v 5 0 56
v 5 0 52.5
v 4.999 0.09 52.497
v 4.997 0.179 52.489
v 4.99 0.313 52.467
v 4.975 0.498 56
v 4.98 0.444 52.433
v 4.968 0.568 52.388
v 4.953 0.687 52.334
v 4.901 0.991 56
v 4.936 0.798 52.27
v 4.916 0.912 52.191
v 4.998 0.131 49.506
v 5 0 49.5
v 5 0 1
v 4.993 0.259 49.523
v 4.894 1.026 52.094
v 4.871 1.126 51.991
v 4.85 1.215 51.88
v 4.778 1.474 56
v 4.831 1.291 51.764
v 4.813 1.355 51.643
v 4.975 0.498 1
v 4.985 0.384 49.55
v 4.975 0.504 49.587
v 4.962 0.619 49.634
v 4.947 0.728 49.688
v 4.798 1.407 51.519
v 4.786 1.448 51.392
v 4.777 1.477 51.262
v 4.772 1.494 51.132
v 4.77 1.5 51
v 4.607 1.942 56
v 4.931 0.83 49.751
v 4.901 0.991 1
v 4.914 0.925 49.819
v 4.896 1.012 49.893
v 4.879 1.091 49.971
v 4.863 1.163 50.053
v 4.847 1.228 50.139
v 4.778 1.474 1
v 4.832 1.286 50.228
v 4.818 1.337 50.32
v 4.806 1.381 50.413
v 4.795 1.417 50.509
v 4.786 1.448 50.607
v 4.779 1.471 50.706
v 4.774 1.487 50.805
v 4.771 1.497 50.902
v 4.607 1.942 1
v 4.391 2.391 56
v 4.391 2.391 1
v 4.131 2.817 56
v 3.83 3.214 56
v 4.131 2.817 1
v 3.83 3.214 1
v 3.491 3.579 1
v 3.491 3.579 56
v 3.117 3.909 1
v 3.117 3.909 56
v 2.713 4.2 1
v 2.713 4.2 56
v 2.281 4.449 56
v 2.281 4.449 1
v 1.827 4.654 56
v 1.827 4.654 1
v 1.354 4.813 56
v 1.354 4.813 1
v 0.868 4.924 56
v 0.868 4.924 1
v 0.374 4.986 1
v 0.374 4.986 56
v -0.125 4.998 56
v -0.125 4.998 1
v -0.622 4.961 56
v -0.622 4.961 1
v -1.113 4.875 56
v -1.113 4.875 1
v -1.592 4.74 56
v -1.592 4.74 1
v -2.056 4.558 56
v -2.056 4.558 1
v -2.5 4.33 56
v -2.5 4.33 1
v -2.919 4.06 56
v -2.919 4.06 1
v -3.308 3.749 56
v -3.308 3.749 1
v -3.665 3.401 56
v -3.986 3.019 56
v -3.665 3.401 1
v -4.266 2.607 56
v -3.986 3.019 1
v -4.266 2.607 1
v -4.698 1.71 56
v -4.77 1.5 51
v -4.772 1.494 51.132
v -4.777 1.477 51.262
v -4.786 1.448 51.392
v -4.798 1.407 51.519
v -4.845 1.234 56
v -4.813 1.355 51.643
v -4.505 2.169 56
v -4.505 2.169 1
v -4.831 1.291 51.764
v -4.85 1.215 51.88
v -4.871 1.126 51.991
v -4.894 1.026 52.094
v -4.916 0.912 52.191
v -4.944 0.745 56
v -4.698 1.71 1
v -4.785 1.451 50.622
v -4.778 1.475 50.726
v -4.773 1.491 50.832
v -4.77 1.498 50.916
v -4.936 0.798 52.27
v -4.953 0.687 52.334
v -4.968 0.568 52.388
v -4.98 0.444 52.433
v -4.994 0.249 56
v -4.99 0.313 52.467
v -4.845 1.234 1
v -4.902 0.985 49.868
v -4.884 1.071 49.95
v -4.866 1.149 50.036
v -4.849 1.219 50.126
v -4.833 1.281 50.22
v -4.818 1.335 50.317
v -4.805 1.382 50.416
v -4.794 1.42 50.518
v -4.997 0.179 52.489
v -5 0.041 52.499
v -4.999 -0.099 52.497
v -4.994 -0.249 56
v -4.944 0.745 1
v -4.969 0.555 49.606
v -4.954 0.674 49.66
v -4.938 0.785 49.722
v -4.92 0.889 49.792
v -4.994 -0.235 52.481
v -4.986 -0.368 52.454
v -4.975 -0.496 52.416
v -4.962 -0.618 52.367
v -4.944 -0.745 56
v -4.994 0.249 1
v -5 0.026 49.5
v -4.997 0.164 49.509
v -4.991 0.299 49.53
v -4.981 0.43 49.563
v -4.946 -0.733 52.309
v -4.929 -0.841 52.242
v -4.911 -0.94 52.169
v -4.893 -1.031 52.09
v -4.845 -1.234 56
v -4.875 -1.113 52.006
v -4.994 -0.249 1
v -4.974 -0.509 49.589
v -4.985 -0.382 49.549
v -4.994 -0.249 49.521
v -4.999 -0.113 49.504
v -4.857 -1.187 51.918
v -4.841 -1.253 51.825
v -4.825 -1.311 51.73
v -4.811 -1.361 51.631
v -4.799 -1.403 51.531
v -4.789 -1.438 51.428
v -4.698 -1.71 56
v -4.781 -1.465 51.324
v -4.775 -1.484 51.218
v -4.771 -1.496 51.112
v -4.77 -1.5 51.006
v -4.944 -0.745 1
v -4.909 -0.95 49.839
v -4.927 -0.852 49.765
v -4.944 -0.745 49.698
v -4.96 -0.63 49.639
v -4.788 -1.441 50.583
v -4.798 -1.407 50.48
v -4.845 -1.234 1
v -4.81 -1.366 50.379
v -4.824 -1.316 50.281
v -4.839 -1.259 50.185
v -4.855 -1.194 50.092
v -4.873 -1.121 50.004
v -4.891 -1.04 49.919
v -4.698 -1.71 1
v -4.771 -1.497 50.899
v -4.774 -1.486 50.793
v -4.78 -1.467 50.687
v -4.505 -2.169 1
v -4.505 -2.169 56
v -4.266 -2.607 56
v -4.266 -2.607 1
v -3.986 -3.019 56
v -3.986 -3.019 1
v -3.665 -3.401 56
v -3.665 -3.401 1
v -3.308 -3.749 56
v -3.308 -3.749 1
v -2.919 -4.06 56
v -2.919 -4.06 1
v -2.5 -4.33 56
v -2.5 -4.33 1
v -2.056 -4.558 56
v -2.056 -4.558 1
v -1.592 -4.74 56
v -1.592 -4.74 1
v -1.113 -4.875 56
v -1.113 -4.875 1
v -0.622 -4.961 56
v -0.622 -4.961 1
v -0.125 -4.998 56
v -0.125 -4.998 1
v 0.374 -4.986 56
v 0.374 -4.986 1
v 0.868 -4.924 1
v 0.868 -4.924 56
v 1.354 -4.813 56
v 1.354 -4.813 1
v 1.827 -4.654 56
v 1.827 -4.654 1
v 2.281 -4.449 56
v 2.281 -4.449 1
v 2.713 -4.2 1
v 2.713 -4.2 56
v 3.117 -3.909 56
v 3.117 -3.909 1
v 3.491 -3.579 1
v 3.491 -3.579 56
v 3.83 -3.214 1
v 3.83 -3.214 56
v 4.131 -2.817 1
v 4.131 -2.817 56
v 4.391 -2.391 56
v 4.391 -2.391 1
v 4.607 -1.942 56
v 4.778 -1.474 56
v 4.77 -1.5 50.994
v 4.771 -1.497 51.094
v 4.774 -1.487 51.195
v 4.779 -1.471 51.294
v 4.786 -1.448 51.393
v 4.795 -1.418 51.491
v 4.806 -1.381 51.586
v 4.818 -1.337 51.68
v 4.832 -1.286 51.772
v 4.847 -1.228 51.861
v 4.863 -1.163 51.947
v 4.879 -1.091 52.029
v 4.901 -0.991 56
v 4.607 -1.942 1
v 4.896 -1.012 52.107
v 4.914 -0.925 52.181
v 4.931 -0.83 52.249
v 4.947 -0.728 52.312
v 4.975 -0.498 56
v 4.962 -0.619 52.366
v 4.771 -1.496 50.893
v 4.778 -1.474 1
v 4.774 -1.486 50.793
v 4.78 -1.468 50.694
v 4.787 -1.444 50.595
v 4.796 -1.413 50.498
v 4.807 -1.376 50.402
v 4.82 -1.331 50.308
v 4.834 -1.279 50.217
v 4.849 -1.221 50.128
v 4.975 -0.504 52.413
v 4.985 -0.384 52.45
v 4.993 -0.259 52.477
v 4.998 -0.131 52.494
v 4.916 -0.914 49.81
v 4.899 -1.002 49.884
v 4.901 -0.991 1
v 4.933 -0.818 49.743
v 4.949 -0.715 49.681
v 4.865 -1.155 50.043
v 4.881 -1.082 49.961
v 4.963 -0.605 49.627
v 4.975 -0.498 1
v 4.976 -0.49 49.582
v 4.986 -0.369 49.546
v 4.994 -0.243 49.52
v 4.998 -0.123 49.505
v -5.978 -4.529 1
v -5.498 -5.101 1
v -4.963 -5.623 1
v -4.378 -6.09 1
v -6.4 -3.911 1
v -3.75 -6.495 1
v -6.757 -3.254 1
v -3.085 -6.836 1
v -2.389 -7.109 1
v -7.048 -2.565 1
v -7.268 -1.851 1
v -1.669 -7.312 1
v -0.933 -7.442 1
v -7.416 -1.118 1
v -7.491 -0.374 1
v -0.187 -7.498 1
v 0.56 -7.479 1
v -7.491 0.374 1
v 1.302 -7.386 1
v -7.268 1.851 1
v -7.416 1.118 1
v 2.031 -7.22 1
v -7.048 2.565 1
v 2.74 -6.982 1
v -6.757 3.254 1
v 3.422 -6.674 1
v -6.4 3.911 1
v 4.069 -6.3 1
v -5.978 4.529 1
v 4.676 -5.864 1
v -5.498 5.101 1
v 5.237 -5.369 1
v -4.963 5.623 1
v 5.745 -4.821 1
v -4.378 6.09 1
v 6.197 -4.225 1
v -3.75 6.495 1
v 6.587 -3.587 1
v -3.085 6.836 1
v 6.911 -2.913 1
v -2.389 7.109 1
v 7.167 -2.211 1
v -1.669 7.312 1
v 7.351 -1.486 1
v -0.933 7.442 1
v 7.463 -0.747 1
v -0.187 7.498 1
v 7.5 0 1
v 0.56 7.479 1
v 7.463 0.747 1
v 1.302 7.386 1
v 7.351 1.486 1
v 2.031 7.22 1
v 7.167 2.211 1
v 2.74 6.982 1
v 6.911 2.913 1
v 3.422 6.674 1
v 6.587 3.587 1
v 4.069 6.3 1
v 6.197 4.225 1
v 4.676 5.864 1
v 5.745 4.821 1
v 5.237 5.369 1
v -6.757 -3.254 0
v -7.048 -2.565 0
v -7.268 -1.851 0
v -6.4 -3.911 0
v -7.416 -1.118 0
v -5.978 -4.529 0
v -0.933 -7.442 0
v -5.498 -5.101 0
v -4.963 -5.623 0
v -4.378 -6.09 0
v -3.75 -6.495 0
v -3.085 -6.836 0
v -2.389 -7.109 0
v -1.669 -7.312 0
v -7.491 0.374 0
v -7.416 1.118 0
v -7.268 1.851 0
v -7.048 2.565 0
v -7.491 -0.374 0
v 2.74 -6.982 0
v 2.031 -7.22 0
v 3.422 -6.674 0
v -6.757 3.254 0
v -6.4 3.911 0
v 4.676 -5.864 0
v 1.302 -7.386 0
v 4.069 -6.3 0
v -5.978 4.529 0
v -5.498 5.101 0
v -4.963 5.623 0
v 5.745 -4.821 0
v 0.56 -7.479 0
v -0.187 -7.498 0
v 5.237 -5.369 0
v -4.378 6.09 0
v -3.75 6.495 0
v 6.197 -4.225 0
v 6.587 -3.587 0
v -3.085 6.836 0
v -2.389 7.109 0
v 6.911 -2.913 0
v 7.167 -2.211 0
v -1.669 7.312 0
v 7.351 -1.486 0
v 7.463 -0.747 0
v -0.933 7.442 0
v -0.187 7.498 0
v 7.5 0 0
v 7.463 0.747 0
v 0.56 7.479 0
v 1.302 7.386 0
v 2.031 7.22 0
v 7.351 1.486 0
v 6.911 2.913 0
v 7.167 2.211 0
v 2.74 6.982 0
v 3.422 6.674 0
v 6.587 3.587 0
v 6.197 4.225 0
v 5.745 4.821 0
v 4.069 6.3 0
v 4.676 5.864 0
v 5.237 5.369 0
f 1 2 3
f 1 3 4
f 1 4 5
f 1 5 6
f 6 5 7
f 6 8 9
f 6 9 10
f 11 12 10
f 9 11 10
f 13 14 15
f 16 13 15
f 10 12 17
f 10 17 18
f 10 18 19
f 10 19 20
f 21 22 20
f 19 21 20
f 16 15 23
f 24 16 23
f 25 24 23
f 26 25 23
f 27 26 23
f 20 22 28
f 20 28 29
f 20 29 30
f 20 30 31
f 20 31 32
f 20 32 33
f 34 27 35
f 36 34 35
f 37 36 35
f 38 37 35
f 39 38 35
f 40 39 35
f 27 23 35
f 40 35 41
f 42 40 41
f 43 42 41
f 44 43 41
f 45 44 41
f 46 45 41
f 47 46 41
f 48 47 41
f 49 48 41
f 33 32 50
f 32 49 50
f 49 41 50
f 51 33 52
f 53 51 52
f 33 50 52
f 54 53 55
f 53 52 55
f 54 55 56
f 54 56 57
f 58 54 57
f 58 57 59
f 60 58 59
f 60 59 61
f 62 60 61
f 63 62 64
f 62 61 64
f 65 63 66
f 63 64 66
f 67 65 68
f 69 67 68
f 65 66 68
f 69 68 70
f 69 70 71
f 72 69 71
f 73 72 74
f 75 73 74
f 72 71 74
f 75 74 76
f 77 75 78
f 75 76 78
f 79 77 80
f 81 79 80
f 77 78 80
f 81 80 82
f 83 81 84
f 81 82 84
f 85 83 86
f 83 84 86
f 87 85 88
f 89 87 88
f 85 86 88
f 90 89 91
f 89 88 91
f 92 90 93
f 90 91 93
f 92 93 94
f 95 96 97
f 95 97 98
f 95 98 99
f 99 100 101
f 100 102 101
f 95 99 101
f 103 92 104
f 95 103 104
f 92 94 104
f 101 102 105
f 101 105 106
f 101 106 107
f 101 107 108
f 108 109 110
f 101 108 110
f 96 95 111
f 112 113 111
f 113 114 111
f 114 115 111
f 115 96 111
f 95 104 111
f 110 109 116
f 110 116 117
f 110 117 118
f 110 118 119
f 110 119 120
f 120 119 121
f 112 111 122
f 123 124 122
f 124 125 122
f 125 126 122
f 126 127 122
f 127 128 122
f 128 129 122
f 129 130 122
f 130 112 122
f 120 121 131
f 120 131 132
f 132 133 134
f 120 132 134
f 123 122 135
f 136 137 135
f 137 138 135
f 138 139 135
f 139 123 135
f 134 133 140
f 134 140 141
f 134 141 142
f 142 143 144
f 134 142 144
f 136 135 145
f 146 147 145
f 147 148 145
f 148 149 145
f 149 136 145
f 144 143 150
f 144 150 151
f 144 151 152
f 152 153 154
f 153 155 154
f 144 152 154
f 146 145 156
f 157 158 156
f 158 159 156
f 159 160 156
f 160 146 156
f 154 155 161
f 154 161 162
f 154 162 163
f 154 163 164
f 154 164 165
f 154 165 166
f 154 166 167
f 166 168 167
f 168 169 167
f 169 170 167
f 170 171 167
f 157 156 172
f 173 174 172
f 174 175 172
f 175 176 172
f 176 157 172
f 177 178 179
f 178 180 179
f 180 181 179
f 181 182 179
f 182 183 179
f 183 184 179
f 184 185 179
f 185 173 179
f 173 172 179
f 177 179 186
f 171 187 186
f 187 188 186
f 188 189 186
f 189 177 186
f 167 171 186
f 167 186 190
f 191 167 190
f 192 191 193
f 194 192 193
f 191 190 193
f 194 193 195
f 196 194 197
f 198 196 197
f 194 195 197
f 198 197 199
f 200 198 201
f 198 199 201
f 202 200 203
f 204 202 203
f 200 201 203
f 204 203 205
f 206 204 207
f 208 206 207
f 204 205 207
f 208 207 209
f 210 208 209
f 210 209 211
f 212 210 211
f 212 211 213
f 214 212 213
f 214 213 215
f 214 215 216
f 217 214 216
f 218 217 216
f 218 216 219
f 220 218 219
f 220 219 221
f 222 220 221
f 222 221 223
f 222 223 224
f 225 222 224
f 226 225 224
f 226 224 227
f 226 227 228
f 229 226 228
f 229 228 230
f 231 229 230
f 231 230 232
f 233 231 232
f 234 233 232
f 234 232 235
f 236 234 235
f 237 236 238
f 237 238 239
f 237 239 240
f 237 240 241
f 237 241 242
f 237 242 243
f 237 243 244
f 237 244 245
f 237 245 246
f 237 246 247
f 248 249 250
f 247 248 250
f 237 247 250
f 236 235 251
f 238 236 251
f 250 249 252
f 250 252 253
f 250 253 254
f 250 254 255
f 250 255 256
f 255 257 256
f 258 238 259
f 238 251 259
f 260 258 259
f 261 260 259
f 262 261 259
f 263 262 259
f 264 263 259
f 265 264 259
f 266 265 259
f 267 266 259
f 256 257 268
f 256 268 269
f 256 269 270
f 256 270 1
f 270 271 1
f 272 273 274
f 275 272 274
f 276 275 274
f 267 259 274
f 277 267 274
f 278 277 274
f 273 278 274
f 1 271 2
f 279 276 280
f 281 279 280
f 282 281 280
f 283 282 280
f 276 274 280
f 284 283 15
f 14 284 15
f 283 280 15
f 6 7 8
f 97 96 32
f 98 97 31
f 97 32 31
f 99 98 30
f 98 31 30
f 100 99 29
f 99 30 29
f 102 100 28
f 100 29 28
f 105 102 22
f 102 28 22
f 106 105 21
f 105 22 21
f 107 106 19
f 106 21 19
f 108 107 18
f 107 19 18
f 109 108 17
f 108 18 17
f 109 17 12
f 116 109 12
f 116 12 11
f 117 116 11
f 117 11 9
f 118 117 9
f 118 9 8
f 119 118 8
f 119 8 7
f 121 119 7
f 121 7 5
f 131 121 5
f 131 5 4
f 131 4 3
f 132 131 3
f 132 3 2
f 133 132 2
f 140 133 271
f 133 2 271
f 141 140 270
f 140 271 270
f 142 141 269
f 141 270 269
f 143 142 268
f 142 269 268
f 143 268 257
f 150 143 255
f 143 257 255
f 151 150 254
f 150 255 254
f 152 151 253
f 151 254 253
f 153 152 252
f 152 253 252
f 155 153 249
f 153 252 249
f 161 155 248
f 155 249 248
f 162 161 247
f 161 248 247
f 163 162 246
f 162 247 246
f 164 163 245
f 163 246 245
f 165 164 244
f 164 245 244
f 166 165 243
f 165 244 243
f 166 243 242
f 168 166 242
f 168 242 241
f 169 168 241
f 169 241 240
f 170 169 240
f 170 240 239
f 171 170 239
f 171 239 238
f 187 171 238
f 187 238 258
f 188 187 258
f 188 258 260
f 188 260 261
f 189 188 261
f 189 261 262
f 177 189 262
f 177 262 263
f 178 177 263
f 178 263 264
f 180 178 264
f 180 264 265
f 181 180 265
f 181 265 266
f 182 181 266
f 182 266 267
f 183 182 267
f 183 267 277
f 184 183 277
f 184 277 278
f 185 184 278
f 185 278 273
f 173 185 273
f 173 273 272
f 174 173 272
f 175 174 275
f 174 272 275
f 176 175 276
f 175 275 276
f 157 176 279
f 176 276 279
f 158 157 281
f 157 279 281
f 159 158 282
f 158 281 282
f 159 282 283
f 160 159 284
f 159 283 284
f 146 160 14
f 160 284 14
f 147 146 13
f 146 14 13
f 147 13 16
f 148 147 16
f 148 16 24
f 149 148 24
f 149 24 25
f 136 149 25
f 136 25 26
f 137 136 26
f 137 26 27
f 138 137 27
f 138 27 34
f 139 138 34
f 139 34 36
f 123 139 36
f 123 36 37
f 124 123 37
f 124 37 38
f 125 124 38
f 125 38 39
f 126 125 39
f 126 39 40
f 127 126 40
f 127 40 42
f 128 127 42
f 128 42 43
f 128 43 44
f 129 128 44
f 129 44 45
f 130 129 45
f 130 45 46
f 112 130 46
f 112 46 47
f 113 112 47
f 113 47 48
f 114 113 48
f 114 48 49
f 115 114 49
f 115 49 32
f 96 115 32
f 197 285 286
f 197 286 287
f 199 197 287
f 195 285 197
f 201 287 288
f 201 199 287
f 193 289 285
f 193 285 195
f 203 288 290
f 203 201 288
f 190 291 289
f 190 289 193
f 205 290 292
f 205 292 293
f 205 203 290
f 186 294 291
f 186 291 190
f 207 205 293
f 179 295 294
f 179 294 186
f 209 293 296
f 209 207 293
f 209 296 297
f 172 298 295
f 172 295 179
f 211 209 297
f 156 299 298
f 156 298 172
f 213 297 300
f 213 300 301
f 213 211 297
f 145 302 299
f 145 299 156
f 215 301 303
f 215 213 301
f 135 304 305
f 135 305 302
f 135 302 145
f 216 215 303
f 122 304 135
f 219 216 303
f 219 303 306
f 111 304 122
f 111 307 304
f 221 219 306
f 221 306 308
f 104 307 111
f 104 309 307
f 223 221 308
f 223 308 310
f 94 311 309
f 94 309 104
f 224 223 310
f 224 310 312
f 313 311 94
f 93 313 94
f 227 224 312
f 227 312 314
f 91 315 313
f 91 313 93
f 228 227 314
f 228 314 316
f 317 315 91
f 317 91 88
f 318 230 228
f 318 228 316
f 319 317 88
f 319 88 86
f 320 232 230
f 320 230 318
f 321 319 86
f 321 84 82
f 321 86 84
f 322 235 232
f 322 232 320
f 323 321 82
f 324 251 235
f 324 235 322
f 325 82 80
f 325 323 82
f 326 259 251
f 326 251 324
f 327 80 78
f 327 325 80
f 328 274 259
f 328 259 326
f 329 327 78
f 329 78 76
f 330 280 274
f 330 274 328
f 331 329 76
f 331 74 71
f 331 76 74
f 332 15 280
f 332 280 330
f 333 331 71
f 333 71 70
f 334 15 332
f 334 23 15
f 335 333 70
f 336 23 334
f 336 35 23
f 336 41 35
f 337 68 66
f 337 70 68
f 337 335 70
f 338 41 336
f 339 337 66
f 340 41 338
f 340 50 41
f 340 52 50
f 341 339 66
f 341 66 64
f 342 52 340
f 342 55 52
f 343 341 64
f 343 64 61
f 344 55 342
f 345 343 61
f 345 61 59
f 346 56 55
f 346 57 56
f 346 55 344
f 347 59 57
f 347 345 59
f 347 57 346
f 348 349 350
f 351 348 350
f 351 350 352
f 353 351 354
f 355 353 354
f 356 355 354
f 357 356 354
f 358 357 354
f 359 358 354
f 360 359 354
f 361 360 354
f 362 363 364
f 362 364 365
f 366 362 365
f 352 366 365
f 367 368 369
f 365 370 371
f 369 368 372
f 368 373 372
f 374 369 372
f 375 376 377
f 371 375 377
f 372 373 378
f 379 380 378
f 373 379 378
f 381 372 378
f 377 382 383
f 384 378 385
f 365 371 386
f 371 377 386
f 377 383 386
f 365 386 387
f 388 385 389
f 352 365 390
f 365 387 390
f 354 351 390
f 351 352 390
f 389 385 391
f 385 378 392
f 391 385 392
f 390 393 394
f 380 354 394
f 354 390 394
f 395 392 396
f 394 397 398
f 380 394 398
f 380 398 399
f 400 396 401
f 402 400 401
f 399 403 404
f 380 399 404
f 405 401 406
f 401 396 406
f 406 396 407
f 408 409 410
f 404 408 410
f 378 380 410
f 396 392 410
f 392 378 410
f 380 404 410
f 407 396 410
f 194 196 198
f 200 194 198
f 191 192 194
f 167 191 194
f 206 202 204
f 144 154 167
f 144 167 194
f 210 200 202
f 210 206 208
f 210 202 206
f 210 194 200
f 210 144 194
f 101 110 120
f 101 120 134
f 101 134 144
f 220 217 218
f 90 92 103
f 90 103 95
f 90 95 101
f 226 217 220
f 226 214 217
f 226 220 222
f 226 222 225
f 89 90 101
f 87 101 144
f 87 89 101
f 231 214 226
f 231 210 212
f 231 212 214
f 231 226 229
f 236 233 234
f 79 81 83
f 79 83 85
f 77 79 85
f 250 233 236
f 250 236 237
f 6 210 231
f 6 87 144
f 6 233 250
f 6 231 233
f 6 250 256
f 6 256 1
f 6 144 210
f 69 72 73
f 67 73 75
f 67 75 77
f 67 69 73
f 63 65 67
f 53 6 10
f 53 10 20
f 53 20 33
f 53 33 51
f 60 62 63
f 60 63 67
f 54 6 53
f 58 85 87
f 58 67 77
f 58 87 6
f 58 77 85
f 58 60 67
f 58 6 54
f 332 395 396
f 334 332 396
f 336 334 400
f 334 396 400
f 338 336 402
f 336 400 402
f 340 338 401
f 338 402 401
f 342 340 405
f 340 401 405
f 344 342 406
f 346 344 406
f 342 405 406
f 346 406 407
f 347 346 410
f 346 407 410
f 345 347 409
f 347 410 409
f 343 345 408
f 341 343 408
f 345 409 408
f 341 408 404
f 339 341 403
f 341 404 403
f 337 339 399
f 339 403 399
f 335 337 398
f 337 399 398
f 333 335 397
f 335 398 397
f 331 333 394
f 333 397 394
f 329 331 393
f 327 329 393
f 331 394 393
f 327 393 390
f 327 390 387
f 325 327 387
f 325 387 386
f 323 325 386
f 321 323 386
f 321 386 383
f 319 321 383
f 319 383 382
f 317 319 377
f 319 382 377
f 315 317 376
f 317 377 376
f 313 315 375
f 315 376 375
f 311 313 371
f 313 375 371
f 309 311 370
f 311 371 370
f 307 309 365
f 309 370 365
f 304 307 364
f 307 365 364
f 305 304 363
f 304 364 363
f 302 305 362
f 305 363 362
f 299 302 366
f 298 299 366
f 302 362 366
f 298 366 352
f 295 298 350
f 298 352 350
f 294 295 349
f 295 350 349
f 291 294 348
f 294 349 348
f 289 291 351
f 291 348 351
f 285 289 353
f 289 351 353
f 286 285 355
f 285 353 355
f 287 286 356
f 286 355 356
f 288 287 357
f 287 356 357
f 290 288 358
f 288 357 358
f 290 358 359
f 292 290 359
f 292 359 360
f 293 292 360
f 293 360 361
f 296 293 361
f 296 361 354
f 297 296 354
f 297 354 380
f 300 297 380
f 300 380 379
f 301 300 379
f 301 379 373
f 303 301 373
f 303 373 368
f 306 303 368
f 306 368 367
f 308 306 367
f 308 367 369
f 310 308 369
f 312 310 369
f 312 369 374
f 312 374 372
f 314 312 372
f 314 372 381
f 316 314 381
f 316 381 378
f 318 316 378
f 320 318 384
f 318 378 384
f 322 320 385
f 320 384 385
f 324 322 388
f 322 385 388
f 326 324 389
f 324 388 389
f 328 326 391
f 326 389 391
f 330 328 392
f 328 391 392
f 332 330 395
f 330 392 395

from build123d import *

# Parameters (mm, degrees)
F0_R     = 7.5
F1_DEPTH = 1
F2_R     = 5
F3_DEPTH = 55
F5_R     = 1.5
F6_DEPTH = 32.501
F7_DEPTH = 48


with BuildPart() as f1:
    # F0 (on Top) → F1 (new body)
    with BuildSketch(Plane.XY):
        Circle(F0_R)
    extrude(amount=F1_DEPTH)

    # F2 (on face) → F3 (join)
    with BuildSketch(Plane.XY.offset(1)):
        Circle(F2_R)
    extrude(amount=F3_DEPTH)

    # F5 (on face) → F6 (cut, through all)
    with BuildSketch(Plane.YZ.offset(25)):
        with Locations((0, 51)):
            Circle(F5_R)
    extrude(amount=-F6_DEPTH, mode=Mode.SUBTRACT)

    # F2 (on face) → F7 (join)
    with BuildSketch(Plane.XY.offset(1)):
        Circle(F2_R)
    extrude(amount=F7_DEPTH)


solid = f1.part
